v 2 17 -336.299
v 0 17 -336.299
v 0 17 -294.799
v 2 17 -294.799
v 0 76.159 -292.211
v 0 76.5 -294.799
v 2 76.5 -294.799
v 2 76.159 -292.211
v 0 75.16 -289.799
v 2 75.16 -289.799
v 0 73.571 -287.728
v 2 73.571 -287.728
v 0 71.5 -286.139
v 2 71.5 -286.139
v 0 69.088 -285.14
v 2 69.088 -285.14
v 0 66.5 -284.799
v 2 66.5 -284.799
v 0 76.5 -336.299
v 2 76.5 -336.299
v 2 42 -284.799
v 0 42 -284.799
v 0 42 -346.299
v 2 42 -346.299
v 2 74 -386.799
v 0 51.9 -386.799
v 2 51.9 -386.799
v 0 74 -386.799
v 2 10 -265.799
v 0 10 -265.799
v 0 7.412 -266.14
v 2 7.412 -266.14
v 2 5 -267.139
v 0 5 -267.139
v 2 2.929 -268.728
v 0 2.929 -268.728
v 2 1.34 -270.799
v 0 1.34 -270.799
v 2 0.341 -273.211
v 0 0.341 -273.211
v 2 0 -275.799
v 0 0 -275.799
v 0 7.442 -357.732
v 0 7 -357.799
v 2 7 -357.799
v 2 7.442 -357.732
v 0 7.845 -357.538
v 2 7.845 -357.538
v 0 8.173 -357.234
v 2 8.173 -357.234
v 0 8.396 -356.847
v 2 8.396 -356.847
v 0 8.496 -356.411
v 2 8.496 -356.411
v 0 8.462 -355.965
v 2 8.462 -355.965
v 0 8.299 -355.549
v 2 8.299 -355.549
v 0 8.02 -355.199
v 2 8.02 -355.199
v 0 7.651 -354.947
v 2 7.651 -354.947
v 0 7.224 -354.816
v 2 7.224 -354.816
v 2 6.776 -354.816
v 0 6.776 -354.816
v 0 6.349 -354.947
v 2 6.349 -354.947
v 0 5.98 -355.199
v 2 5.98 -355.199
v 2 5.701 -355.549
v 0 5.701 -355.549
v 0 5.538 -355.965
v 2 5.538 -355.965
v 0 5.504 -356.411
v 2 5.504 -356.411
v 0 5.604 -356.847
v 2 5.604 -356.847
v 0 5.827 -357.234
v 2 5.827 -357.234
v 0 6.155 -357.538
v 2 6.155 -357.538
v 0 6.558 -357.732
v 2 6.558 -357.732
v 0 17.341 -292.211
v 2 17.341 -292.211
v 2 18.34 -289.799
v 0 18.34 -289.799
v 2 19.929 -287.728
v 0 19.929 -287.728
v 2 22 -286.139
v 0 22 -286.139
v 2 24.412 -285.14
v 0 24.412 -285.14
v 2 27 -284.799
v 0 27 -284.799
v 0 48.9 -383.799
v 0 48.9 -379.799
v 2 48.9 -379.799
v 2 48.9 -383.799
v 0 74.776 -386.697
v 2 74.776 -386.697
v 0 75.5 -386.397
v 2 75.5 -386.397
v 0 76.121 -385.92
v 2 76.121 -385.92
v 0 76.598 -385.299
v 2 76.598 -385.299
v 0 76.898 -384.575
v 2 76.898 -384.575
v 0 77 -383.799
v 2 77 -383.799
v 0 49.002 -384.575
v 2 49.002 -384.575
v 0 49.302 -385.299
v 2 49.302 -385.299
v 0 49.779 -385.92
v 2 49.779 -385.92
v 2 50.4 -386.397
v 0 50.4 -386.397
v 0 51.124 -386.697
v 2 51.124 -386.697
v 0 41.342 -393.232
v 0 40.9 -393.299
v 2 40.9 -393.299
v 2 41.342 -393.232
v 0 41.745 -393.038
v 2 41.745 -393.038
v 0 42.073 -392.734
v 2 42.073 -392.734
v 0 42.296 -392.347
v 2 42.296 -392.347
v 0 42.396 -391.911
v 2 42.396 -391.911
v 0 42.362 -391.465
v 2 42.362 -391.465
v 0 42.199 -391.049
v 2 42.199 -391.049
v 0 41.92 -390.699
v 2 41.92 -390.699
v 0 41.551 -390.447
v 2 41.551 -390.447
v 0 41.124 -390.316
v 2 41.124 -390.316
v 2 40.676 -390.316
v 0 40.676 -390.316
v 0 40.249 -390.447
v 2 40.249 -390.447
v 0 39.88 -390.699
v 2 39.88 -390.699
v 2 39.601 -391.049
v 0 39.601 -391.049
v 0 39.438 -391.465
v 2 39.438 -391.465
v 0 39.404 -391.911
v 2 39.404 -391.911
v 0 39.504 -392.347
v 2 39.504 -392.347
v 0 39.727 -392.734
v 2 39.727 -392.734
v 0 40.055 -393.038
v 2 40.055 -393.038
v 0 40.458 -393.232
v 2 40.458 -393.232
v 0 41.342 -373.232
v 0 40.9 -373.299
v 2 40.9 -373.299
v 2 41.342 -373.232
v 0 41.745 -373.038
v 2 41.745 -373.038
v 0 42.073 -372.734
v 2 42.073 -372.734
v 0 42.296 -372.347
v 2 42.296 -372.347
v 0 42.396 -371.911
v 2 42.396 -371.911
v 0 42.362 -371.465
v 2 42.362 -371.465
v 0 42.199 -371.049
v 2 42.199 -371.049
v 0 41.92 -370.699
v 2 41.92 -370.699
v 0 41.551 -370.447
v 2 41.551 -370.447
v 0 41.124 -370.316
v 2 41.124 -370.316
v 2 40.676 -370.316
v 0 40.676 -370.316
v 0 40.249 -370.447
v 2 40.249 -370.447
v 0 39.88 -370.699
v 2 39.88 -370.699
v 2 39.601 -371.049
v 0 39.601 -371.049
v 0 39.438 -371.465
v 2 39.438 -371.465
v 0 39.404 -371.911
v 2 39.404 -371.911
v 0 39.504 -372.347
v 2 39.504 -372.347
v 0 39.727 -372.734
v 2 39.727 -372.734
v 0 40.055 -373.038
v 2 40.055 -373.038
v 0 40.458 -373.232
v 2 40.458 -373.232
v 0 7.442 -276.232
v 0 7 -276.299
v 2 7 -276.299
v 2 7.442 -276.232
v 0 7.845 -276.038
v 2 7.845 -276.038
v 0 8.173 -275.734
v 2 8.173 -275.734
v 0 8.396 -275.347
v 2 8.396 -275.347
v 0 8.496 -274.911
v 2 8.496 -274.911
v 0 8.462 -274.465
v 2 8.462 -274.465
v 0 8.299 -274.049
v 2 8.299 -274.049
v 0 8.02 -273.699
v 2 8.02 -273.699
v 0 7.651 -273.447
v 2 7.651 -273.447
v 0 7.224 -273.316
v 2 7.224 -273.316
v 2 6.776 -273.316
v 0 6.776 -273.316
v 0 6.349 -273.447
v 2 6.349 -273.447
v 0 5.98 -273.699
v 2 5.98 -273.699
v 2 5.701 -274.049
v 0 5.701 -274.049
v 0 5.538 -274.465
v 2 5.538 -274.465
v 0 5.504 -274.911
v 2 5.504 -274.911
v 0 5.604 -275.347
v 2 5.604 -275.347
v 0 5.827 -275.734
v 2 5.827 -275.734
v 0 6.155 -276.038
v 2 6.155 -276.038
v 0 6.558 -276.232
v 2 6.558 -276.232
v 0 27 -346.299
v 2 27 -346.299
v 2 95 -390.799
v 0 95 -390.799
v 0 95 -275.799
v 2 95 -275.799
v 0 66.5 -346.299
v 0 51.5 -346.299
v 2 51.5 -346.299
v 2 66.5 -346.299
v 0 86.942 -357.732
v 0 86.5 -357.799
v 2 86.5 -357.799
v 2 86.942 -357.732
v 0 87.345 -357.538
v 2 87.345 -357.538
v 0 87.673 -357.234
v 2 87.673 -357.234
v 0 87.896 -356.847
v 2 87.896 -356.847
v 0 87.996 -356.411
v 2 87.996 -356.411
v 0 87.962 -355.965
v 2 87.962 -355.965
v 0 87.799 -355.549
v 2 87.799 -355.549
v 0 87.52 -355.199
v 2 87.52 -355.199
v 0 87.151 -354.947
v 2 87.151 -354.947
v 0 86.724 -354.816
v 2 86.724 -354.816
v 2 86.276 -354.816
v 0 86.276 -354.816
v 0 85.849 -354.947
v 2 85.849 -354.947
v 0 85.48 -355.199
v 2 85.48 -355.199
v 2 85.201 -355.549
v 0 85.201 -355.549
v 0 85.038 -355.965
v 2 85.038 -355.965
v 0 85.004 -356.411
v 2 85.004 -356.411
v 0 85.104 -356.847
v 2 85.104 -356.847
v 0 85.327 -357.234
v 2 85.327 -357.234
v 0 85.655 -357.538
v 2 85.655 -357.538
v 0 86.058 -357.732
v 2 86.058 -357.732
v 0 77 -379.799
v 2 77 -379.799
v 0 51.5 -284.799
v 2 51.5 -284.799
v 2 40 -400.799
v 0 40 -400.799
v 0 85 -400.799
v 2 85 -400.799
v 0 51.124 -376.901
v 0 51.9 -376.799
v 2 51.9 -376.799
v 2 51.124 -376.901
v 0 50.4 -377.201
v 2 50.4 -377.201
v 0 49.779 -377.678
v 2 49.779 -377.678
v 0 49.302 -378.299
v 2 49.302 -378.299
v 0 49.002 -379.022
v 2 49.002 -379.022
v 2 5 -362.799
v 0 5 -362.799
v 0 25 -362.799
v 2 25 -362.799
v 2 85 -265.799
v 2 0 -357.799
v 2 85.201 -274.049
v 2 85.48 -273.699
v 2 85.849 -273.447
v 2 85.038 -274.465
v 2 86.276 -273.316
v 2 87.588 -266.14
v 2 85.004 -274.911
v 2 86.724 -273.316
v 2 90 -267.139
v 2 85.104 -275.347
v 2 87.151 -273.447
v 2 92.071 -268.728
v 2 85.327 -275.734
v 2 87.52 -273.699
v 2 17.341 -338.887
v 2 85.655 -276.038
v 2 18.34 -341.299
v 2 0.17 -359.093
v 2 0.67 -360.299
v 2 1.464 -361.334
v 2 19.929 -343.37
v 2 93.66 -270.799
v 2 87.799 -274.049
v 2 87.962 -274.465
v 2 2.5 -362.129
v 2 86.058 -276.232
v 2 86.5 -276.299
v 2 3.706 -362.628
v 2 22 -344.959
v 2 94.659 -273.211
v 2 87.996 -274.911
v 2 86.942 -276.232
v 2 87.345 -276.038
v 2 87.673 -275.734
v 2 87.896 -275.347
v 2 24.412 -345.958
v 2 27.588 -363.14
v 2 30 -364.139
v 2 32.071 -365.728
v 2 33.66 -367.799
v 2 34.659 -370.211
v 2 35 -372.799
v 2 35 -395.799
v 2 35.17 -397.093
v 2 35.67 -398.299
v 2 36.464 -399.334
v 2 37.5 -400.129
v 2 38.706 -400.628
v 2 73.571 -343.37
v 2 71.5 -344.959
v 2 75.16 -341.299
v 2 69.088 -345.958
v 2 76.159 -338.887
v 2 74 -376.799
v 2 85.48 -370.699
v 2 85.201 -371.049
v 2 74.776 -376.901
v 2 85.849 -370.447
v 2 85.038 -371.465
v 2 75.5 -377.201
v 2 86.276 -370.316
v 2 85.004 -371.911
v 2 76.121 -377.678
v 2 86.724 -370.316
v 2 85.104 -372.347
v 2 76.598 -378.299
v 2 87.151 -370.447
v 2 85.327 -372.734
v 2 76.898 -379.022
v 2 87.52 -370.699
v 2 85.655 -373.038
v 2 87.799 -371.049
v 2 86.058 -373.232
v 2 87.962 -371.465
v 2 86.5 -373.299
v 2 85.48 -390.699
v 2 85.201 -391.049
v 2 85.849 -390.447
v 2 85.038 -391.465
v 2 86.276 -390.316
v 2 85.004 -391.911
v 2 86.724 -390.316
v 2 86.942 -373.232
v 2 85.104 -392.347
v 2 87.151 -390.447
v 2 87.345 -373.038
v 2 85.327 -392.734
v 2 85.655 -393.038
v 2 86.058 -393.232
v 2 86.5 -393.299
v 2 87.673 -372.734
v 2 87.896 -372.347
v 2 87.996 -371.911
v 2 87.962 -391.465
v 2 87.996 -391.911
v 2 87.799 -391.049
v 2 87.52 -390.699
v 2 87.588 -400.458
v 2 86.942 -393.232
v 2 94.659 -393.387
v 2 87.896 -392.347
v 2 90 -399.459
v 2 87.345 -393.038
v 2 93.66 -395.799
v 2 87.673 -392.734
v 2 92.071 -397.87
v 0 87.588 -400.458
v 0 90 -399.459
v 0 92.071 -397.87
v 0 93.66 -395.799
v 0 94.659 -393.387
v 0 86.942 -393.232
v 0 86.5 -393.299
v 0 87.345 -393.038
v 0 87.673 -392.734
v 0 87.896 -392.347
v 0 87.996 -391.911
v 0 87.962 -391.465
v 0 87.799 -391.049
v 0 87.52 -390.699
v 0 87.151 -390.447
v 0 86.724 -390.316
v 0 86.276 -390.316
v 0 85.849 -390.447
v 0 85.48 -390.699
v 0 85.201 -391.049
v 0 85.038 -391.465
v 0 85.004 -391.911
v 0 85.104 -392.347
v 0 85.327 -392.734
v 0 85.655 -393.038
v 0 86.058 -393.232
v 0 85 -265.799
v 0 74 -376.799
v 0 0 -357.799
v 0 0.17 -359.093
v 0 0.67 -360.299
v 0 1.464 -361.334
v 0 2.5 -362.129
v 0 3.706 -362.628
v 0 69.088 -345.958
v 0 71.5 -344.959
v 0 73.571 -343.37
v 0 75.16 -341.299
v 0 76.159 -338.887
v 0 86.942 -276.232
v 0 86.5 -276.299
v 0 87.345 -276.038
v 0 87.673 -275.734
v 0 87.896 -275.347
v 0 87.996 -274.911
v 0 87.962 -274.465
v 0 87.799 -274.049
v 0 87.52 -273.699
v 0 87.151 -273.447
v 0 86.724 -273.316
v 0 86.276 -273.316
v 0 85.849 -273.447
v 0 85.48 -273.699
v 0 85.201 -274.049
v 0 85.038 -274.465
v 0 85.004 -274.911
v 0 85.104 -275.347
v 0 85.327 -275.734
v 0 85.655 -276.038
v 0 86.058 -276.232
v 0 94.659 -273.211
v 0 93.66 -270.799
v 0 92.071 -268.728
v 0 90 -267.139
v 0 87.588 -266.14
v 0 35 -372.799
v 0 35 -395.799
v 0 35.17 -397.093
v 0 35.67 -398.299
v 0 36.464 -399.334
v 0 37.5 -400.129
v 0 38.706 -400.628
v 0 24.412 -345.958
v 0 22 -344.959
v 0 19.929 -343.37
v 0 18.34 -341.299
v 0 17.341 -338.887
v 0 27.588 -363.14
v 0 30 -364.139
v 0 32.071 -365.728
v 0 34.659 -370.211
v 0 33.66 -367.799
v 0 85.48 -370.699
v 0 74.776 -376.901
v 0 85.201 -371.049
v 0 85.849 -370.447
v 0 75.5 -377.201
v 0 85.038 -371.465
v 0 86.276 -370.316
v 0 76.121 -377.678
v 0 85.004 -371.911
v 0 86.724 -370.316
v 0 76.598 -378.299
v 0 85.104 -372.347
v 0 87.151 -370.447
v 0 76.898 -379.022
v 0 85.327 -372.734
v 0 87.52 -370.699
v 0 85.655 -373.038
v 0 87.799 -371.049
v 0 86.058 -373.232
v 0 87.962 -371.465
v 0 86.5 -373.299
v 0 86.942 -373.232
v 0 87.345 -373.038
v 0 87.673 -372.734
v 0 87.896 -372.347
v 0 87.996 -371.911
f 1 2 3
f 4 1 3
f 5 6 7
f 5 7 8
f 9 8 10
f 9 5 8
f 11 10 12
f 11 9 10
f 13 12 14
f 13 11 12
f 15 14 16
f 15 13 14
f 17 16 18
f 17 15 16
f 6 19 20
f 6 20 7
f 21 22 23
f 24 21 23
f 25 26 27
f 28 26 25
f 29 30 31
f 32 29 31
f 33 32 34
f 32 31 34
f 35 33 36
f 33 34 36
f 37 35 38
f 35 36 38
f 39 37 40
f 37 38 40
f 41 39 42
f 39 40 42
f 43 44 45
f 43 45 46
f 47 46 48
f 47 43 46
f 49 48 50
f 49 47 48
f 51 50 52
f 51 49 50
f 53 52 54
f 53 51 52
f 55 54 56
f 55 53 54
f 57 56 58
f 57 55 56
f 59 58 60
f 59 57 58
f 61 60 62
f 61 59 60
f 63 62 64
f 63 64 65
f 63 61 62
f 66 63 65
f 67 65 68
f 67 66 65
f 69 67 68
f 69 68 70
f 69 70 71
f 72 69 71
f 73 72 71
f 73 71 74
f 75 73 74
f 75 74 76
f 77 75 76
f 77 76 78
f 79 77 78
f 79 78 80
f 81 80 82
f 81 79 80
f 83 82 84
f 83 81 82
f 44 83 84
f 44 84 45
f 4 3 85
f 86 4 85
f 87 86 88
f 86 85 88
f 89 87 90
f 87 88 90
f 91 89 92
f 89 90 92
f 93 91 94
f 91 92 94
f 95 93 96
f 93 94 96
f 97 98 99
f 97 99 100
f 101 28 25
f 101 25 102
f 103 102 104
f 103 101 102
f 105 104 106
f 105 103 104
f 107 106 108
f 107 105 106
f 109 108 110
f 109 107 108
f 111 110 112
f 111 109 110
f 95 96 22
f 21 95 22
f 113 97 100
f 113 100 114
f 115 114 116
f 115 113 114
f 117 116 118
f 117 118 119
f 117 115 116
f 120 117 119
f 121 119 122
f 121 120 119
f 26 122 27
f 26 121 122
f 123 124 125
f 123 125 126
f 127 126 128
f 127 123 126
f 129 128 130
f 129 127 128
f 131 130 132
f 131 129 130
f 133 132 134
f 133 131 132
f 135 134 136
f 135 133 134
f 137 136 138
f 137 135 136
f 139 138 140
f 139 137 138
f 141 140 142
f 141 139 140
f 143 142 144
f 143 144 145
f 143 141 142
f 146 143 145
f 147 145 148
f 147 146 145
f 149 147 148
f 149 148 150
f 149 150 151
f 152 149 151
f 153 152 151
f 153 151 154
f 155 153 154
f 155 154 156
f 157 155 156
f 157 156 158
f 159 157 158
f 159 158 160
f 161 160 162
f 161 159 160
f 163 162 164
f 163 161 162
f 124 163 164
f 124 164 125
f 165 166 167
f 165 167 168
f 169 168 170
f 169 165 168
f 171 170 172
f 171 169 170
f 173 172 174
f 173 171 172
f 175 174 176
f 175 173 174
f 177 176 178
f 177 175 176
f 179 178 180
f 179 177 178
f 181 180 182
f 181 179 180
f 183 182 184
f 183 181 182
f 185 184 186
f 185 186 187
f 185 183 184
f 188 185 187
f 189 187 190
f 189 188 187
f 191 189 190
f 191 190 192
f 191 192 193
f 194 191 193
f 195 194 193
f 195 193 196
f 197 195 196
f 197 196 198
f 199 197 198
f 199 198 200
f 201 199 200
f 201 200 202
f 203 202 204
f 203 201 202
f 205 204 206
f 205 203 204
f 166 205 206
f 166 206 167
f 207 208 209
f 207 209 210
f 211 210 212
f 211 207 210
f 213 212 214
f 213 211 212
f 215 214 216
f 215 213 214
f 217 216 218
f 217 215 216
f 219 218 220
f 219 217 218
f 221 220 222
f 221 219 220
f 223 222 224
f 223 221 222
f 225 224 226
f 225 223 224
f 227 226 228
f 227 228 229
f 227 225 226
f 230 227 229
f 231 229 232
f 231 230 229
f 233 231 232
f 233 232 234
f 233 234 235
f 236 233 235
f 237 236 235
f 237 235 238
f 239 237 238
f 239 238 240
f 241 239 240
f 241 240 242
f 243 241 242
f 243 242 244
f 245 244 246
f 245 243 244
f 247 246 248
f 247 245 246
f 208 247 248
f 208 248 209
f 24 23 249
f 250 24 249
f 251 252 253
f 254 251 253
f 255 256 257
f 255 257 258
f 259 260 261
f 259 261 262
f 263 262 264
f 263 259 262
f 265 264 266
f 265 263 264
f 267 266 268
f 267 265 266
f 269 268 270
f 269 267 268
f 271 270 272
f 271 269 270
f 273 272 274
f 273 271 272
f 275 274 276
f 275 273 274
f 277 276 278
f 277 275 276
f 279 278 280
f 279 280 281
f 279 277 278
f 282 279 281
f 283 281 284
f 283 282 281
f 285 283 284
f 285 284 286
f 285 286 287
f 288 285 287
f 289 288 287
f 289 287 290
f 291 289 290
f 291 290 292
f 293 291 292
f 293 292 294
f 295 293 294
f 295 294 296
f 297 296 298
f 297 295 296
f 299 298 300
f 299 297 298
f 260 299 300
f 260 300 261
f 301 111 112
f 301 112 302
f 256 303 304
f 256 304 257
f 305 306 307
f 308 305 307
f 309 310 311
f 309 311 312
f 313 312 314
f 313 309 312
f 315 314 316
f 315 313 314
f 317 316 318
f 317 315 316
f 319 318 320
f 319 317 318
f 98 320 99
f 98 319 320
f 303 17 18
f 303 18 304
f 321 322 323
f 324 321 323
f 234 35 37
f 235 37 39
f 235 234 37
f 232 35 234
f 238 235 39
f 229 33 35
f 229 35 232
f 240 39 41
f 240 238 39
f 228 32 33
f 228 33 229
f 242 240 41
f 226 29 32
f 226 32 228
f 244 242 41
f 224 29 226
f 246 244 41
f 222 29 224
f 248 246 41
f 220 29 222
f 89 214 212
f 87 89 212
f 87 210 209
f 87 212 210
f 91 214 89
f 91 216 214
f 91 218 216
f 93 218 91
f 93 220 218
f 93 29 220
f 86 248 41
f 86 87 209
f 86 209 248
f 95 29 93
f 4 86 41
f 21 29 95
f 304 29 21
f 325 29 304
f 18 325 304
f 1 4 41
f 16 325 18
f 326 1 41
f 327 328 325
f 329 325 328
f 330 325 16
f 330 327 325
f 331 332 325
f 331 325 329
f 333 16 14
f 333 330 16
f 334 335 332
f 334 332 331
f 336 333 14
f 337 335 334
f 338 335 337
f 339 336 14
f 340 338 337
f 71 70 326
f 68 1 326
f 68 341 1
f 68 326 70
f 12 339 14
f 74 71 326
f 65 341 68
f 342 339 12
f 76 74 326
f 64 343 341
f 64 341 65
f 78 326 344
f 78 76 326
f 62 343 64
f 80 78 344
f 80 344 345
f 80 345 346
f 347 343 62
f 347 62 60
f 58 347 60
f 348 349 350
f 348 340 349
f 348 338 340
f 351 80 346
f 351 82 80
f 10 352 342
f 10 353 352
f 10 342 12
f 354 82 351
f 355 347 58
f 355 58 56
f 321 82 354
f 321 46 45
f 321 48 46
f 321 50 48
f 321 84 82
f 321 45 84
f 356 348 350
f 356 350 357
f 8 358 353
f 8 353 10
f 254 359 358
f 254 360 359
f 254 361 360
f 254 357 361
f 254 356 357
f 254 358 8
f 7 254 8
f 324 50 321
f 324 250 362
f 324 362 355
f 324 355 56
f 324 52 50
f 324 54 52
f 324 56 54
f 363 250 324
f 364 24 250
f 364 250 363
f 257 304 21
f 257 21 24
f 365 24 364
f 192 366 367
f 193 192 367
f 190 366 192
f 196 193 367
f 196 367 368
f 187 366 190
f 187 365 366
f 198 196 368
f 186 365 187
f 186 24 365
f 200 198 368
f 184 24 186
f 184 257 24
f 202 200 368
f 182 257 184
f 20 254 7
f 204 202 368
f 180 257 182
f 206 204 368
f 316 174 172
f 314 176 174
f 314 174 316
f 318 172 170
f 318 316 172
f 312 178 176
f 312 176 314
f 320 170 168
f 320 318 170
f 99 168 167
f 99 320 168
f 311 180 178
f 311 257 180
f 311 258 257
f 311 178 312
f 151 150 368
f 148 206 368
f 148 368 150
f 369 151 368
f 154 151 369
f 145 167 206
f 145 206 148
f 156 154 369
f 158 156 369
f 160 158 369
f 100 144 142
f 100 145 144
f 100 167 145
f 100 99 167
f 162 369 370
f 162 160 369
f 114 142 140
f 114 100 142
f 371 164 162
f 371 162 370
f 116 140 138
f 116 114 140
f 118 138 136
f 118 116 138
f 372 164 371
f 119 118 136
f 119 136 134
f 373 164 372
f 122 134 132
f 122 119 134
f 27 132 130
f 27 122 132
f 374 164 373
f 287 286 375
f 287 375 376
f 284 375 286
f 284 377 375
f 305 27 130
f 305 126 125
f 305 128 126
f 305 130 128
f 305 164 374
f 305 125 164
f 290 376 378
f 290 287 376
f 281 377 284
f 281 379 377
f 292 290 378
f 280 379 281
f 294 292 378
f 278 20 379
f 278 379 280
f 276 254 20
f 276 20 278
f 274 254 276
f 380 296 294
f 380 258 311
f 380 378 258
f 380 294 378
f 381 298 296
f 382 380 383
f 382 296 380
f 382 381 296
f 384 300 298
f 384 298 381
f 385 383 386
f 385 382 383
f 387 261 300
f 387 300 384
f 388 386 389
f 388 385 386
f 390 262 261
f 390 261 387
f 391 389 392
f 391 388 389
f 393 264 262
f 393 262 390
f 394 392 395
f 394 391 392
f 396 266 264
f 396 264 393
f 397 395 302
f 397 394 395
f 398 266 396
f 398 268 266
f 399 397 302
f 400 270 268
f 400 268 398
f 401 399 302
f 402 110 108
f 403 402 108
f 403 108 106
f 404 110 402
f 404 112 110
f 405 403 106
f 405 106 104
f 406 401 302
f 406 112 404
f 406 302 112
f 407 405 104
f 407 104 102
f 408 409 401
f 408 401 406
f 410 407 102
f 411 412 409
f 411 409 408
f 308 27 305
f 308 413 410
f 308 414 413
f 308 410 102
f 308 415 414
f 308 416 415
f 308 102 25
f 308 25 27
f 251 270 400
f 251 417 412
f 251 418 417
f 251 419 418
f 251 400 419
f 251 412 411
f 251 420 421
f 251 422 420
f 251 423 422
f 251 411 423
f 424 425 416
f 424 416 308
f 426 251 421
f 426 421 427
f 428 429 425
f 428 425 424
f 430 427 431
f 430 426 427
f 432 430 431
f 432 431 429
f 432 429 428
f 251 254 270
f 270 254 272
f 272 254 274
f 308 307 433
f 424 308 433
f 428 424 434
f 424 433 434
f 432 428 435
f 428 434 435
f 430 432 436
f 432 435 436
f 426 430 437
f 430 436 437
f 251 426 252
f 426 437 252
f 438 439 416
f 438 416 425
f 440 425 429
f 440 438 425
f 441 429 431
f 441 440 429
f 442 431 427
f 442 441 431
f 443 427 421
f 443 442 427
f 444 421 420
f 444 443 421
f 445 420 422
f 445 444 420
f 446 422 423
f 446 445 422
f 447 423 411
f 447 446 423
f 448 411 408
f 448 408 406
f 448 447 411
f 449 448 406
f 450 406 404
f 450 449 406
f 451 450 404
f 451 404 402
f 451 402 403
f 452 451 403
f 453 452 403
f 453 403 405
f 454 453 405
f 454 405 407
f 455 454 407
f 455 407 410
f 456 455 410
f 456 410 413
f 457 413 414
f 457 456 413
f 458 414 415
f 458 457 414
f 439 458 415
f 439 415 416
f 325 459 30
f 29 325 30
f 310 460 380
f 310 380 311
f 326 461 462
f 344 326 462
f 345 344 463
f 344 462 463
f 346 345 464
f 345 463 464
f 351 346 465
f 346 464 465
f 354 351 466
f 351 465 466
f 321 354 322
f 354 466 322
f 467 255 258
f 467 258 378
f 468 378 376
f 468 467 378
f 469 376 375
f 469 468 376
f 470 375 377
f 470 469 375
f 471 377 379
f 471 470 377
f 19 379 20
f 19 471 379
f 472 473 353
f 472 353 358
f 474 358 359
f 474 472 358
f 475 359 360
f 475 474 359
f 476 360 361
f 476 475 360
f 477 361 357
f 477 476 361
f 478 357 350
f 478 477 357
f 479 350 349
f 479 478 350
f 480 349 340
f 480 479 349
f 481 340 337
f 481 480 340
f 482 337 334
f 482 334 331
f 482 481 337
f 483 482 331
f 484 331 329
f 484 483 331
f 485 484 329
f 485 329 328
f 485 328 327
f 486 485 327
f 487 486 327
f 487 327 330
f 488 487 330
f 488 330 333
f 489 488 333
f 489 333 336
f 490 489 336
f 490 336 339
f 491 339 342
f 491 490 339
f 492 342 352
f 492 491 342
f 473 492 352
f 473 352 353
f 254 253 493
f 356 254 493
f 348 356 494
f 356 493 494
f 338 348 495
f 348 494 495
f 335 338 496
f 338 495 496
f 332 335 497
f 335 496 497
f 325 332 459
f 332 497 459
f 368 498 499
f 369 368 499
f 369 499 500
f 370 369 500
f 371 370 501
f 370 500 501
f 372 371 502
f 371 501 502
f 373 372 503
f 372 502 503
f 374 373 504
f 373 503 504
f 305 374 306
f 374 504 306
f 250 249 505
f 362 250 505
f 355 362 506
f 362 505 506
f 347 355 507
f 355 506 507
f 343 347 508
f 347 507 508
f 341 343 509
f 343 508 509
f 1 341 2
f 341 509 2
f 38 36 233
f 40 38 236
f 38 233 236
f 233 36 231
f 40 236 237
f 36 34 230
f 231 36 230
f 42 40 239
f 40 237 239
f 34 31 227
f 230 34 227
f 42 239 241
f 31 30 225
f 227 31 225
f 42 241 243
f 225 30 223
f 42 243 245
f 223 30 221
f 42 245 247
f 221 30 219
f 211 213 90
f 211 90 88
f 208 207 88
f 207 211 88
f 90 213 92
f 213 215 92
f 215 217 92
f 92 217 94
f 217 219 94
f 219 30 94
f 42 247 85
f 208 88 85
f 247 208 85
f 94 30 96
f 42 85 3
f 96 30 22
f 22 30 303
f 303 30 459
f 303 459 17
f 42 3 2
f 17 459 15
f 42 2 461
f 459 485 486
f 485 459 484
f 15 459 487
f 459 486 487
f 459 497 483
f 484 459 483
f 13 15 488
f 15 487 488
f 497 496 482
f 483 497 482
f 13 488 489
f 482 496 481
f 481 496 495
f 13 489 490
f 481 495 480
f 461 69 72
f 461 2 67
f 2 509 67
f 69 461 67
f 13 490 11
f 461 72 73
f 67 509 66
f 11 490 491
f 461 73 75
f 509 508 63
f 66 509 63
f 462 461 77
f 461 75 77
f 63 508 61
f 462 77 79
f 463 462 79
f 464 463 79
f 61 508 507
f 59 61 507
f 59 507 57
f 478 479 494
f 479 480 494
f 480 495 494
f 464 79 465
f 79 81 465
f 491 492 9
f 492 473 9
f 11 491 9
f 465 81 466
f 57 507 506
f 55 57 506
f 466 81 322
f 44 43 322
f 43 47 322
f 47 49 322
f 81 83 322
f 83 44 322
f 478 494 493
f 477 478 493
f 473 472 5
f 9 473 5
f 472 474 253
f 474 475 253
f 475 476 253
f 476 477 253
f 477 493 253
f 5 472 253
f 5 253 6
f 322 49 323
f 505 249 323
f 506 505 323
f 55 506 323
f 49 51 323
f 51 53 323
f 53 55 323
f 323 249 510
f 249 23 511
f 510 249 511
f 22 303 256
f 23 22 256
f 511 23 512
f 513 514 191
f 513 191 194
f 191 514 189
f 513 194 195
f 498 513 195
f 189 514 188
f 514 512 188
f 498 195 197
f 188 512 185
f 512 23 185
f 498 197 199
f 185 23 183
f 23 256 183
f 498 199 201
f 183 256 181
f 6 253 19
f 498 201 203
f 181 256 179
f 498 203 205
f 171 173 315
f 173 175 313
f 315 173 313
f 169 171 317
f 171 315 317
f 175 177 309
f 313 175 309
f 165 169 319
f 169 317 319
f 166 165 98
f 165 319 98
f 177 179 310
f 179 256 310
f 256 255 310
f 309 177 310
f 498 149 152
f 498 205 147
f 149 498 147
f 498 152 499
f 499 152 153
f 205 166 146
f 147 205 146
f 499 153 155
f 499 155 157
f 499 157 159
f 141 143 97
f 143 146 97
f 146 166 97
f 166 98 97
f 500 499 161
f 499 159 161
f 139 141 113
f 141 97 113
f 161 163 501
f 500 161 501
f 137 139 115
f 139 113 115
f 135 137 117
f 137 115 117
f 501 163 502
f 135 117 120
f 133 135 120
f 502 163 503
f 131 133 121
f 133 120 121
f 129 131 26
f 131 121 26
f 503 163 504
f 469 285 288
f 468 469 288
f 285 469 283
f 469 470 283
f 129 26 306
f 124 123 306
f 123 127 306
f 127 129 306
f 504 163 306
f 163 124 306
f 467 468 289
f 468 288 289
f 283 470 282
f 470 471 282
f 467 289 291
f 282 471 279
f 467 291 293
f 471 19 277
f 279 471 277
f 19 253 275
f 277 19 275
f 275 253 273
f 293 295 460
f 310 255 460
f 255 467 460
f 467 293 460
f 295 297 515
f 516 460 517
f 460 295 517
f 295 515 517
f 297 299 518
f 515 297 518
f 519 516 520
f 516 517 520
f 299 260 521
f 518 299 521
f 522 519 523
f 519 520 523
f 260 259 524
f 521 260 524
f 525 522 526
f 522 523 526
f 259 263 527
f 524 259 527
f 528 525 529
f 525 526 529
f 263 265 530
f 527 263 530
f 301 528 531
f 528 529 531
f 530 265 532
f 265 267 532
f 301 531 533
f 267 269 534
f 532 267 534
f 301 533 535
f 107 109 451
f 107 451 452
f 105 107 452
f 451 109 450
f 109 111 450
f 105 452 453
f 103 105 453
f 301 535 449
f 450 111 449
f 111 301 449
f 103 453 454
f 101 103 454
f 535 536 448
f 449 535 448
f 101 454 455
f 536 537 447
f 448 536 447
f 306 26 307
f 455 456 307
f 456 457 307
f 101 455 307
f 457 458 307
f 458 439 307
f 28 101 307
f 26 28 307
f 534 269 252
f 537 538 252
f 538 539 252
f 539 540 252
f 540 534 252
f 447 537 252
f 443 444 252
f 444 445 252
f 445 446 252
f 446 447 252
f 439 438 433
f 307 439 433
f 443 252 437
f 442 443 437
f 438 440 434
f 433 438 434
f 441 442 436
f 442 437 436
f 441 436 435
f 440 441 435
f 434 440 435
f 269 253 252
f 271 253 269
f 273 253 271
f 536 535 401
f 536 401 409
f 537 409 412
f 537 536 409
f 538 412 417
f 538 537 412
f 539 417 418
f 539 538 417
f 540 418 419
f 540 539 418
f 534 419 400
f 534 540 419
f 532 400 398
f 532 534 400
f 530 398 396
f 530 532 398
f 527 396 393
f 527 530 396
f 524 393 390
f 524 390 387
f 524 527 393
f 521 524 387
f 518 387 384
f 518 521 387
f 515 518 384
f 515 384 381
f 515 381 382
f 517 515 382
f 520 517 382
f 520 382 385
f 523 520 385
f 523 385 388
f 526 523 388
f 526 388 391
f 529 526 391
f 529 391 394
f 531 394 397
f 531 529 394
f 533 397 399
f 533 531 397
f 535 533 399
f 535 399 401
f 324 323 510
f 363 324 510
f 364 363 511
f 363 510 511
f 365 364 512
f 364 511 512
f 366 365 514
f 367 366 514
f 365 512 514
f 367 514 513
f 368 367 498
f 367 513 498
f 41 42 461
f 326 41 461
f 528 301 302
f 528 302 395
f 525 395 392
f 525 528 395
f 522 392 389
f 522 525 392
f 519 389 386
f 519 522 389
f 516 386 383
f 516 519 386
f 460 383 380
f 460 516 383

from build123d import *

# Parameters (mm, degrees)
SKETCH2_R           = 1.5
BOSS_EXTRUDE1_DEPTH = 2


with BuildPart() as part:
    # Sketch2 → Boss-Extrude1 (new body)
    with BuildSketch(Plane(origin=(0, 0, 0), x_dir=(0, 0, -1), z_dir=(1, 0, 0))):
        with BuildLine():
            Line((390.798820845, 95), (275.798820845, 95))
            ThreePointArc((275.798820845, 95), (268.727753033, 92.071067812), (265.798820845, 85))
            Line((265.798820845, 85), (265.798820845, 10))
            ThreePointArc((265.798820845, 10), (268.727753033, 2.928932188), (275.798820845, 0))
            Line((275.798820845, 0), (357.798820845, 0))
            ThreePointArc((357.798820845, 0), (361.334354751, 1.464466094), (362.798820845, 5))
            Line((362.798820845, 5), (362.798820845, 25))
            ThreePointArc((362.798820845, 25), (365.727753033, 32.071067812), (372.798820845, 35))
            Line((372.798820845, 35), (395.798820845, 35))
            ThreePointArc((395.798820845, 35), (399.334354751, 36.464466094), (400.798820845, 40))
            Line((400.798820845, 40), (400.798820845, 85))
            ThreePointArc((400.798820845, 85), (397.869888657, 92.071067812), (390.798820845, 95))
        make_face()
        with Locations((371.798820845, 86.5)):
            Circle(SKETCH2_R, mode=Mode.SUBTRACT)
        with Locations((391.798820845, 86.5)):
            Circle(SKETCH2_R, mode=Mode.SUBTRACT)
        with Locations((391.798820845, 40.9)):
            Circle(SKETCH2_R, mode=Mode.SUBTRACT)
        with Locations((371.798820845, 40.9)):
            Circle(SKETCH2_R, mode=Mode.SUBTRACT)
        with Locations((356.298820845, 7)):
            Circle(SKETCH2_R, mode=Mode.SUBTRACT)
        with Locations((274.798820845, 7)):
            Circle(SKETCH2_R, mode=Mode.SUBTRACT)
        with Locations((274.798820845, 86.5)):
            Circle(SKETCH2_R, mode=Mode.SUBTRACT)
        with Locations((356.298820845, 86.5)):
            Circle(SKETCH2_R, mode=Mode.SUBTRACT)
        with BuildLine():
            Line((284.798820845, 42), (346.298820845, 42))
            Line((346.298820845, 42), (346.298820845, 27))
            ThreePointArc((346.298820845, 27), (343.369888657, 19.928932188), (336.298820845, 17))
            Line((336.298820845, 17), (294.798820845, 17))
            ThreePointArc((294.798820845, 17), (287.727753033, 19.928932188), (284.798820845, 27))
            Line((284.798820845, 27), (284.798820845, 42))
        make_face(mode=Mode.SUBTRACT)
        with BuildLine():
            Line((336.298820845, 76.5), (294.798820845, 76.5))
            ThreePointArc((294.798820845, 76.5), (287.727753033, 73.571067812), (284.798820845, 66.5))
            Line((284.798820845, 66.5), (284.798820845, 51.5))
            Line((284.798820845, 51.5), (346.298820845, 51.5))
            Line((346.298820845, 51.5), (346.298820845, 66.5))
            ThreePointArc((346.298820845, 66.5), (343.369888657, 73.571067812), (336.298820845, 76.5))
        make_face(mode=Mode.SUBTRACT)
        with BuildLine():
            Line((383.798820845, 77), (379.798820845, 77))
            ThreePointArc((379.798820845, 77), (377.677500501, 76.121320344), (376.798820845, 74))
            Line((376.798820845, 74), (376.798820845, 51.9))
            ThreePointArc((376.798820845, 51.9), (377.677500501, 49.778679656), (379.798820845, 48.9))
            Line((379.798820845, 48.9), (383.798820845, 48.9))
            ThreePointArc((383.798820845, 48.9), (385.920141188, 49.778679656), (386.798820845, 51.9))
            Line((386.798820845, 51.9), (386.798820845, 74))
            ThreePointArc((386.798820845, 74), (385.920141188, 76.121320344), (383.798820845, 77))
        make_face(mode=Mode.SUBTRACT)
    extrude(amount=BOSS_EXTRUDE1_DEPTH)


solid = part.part
